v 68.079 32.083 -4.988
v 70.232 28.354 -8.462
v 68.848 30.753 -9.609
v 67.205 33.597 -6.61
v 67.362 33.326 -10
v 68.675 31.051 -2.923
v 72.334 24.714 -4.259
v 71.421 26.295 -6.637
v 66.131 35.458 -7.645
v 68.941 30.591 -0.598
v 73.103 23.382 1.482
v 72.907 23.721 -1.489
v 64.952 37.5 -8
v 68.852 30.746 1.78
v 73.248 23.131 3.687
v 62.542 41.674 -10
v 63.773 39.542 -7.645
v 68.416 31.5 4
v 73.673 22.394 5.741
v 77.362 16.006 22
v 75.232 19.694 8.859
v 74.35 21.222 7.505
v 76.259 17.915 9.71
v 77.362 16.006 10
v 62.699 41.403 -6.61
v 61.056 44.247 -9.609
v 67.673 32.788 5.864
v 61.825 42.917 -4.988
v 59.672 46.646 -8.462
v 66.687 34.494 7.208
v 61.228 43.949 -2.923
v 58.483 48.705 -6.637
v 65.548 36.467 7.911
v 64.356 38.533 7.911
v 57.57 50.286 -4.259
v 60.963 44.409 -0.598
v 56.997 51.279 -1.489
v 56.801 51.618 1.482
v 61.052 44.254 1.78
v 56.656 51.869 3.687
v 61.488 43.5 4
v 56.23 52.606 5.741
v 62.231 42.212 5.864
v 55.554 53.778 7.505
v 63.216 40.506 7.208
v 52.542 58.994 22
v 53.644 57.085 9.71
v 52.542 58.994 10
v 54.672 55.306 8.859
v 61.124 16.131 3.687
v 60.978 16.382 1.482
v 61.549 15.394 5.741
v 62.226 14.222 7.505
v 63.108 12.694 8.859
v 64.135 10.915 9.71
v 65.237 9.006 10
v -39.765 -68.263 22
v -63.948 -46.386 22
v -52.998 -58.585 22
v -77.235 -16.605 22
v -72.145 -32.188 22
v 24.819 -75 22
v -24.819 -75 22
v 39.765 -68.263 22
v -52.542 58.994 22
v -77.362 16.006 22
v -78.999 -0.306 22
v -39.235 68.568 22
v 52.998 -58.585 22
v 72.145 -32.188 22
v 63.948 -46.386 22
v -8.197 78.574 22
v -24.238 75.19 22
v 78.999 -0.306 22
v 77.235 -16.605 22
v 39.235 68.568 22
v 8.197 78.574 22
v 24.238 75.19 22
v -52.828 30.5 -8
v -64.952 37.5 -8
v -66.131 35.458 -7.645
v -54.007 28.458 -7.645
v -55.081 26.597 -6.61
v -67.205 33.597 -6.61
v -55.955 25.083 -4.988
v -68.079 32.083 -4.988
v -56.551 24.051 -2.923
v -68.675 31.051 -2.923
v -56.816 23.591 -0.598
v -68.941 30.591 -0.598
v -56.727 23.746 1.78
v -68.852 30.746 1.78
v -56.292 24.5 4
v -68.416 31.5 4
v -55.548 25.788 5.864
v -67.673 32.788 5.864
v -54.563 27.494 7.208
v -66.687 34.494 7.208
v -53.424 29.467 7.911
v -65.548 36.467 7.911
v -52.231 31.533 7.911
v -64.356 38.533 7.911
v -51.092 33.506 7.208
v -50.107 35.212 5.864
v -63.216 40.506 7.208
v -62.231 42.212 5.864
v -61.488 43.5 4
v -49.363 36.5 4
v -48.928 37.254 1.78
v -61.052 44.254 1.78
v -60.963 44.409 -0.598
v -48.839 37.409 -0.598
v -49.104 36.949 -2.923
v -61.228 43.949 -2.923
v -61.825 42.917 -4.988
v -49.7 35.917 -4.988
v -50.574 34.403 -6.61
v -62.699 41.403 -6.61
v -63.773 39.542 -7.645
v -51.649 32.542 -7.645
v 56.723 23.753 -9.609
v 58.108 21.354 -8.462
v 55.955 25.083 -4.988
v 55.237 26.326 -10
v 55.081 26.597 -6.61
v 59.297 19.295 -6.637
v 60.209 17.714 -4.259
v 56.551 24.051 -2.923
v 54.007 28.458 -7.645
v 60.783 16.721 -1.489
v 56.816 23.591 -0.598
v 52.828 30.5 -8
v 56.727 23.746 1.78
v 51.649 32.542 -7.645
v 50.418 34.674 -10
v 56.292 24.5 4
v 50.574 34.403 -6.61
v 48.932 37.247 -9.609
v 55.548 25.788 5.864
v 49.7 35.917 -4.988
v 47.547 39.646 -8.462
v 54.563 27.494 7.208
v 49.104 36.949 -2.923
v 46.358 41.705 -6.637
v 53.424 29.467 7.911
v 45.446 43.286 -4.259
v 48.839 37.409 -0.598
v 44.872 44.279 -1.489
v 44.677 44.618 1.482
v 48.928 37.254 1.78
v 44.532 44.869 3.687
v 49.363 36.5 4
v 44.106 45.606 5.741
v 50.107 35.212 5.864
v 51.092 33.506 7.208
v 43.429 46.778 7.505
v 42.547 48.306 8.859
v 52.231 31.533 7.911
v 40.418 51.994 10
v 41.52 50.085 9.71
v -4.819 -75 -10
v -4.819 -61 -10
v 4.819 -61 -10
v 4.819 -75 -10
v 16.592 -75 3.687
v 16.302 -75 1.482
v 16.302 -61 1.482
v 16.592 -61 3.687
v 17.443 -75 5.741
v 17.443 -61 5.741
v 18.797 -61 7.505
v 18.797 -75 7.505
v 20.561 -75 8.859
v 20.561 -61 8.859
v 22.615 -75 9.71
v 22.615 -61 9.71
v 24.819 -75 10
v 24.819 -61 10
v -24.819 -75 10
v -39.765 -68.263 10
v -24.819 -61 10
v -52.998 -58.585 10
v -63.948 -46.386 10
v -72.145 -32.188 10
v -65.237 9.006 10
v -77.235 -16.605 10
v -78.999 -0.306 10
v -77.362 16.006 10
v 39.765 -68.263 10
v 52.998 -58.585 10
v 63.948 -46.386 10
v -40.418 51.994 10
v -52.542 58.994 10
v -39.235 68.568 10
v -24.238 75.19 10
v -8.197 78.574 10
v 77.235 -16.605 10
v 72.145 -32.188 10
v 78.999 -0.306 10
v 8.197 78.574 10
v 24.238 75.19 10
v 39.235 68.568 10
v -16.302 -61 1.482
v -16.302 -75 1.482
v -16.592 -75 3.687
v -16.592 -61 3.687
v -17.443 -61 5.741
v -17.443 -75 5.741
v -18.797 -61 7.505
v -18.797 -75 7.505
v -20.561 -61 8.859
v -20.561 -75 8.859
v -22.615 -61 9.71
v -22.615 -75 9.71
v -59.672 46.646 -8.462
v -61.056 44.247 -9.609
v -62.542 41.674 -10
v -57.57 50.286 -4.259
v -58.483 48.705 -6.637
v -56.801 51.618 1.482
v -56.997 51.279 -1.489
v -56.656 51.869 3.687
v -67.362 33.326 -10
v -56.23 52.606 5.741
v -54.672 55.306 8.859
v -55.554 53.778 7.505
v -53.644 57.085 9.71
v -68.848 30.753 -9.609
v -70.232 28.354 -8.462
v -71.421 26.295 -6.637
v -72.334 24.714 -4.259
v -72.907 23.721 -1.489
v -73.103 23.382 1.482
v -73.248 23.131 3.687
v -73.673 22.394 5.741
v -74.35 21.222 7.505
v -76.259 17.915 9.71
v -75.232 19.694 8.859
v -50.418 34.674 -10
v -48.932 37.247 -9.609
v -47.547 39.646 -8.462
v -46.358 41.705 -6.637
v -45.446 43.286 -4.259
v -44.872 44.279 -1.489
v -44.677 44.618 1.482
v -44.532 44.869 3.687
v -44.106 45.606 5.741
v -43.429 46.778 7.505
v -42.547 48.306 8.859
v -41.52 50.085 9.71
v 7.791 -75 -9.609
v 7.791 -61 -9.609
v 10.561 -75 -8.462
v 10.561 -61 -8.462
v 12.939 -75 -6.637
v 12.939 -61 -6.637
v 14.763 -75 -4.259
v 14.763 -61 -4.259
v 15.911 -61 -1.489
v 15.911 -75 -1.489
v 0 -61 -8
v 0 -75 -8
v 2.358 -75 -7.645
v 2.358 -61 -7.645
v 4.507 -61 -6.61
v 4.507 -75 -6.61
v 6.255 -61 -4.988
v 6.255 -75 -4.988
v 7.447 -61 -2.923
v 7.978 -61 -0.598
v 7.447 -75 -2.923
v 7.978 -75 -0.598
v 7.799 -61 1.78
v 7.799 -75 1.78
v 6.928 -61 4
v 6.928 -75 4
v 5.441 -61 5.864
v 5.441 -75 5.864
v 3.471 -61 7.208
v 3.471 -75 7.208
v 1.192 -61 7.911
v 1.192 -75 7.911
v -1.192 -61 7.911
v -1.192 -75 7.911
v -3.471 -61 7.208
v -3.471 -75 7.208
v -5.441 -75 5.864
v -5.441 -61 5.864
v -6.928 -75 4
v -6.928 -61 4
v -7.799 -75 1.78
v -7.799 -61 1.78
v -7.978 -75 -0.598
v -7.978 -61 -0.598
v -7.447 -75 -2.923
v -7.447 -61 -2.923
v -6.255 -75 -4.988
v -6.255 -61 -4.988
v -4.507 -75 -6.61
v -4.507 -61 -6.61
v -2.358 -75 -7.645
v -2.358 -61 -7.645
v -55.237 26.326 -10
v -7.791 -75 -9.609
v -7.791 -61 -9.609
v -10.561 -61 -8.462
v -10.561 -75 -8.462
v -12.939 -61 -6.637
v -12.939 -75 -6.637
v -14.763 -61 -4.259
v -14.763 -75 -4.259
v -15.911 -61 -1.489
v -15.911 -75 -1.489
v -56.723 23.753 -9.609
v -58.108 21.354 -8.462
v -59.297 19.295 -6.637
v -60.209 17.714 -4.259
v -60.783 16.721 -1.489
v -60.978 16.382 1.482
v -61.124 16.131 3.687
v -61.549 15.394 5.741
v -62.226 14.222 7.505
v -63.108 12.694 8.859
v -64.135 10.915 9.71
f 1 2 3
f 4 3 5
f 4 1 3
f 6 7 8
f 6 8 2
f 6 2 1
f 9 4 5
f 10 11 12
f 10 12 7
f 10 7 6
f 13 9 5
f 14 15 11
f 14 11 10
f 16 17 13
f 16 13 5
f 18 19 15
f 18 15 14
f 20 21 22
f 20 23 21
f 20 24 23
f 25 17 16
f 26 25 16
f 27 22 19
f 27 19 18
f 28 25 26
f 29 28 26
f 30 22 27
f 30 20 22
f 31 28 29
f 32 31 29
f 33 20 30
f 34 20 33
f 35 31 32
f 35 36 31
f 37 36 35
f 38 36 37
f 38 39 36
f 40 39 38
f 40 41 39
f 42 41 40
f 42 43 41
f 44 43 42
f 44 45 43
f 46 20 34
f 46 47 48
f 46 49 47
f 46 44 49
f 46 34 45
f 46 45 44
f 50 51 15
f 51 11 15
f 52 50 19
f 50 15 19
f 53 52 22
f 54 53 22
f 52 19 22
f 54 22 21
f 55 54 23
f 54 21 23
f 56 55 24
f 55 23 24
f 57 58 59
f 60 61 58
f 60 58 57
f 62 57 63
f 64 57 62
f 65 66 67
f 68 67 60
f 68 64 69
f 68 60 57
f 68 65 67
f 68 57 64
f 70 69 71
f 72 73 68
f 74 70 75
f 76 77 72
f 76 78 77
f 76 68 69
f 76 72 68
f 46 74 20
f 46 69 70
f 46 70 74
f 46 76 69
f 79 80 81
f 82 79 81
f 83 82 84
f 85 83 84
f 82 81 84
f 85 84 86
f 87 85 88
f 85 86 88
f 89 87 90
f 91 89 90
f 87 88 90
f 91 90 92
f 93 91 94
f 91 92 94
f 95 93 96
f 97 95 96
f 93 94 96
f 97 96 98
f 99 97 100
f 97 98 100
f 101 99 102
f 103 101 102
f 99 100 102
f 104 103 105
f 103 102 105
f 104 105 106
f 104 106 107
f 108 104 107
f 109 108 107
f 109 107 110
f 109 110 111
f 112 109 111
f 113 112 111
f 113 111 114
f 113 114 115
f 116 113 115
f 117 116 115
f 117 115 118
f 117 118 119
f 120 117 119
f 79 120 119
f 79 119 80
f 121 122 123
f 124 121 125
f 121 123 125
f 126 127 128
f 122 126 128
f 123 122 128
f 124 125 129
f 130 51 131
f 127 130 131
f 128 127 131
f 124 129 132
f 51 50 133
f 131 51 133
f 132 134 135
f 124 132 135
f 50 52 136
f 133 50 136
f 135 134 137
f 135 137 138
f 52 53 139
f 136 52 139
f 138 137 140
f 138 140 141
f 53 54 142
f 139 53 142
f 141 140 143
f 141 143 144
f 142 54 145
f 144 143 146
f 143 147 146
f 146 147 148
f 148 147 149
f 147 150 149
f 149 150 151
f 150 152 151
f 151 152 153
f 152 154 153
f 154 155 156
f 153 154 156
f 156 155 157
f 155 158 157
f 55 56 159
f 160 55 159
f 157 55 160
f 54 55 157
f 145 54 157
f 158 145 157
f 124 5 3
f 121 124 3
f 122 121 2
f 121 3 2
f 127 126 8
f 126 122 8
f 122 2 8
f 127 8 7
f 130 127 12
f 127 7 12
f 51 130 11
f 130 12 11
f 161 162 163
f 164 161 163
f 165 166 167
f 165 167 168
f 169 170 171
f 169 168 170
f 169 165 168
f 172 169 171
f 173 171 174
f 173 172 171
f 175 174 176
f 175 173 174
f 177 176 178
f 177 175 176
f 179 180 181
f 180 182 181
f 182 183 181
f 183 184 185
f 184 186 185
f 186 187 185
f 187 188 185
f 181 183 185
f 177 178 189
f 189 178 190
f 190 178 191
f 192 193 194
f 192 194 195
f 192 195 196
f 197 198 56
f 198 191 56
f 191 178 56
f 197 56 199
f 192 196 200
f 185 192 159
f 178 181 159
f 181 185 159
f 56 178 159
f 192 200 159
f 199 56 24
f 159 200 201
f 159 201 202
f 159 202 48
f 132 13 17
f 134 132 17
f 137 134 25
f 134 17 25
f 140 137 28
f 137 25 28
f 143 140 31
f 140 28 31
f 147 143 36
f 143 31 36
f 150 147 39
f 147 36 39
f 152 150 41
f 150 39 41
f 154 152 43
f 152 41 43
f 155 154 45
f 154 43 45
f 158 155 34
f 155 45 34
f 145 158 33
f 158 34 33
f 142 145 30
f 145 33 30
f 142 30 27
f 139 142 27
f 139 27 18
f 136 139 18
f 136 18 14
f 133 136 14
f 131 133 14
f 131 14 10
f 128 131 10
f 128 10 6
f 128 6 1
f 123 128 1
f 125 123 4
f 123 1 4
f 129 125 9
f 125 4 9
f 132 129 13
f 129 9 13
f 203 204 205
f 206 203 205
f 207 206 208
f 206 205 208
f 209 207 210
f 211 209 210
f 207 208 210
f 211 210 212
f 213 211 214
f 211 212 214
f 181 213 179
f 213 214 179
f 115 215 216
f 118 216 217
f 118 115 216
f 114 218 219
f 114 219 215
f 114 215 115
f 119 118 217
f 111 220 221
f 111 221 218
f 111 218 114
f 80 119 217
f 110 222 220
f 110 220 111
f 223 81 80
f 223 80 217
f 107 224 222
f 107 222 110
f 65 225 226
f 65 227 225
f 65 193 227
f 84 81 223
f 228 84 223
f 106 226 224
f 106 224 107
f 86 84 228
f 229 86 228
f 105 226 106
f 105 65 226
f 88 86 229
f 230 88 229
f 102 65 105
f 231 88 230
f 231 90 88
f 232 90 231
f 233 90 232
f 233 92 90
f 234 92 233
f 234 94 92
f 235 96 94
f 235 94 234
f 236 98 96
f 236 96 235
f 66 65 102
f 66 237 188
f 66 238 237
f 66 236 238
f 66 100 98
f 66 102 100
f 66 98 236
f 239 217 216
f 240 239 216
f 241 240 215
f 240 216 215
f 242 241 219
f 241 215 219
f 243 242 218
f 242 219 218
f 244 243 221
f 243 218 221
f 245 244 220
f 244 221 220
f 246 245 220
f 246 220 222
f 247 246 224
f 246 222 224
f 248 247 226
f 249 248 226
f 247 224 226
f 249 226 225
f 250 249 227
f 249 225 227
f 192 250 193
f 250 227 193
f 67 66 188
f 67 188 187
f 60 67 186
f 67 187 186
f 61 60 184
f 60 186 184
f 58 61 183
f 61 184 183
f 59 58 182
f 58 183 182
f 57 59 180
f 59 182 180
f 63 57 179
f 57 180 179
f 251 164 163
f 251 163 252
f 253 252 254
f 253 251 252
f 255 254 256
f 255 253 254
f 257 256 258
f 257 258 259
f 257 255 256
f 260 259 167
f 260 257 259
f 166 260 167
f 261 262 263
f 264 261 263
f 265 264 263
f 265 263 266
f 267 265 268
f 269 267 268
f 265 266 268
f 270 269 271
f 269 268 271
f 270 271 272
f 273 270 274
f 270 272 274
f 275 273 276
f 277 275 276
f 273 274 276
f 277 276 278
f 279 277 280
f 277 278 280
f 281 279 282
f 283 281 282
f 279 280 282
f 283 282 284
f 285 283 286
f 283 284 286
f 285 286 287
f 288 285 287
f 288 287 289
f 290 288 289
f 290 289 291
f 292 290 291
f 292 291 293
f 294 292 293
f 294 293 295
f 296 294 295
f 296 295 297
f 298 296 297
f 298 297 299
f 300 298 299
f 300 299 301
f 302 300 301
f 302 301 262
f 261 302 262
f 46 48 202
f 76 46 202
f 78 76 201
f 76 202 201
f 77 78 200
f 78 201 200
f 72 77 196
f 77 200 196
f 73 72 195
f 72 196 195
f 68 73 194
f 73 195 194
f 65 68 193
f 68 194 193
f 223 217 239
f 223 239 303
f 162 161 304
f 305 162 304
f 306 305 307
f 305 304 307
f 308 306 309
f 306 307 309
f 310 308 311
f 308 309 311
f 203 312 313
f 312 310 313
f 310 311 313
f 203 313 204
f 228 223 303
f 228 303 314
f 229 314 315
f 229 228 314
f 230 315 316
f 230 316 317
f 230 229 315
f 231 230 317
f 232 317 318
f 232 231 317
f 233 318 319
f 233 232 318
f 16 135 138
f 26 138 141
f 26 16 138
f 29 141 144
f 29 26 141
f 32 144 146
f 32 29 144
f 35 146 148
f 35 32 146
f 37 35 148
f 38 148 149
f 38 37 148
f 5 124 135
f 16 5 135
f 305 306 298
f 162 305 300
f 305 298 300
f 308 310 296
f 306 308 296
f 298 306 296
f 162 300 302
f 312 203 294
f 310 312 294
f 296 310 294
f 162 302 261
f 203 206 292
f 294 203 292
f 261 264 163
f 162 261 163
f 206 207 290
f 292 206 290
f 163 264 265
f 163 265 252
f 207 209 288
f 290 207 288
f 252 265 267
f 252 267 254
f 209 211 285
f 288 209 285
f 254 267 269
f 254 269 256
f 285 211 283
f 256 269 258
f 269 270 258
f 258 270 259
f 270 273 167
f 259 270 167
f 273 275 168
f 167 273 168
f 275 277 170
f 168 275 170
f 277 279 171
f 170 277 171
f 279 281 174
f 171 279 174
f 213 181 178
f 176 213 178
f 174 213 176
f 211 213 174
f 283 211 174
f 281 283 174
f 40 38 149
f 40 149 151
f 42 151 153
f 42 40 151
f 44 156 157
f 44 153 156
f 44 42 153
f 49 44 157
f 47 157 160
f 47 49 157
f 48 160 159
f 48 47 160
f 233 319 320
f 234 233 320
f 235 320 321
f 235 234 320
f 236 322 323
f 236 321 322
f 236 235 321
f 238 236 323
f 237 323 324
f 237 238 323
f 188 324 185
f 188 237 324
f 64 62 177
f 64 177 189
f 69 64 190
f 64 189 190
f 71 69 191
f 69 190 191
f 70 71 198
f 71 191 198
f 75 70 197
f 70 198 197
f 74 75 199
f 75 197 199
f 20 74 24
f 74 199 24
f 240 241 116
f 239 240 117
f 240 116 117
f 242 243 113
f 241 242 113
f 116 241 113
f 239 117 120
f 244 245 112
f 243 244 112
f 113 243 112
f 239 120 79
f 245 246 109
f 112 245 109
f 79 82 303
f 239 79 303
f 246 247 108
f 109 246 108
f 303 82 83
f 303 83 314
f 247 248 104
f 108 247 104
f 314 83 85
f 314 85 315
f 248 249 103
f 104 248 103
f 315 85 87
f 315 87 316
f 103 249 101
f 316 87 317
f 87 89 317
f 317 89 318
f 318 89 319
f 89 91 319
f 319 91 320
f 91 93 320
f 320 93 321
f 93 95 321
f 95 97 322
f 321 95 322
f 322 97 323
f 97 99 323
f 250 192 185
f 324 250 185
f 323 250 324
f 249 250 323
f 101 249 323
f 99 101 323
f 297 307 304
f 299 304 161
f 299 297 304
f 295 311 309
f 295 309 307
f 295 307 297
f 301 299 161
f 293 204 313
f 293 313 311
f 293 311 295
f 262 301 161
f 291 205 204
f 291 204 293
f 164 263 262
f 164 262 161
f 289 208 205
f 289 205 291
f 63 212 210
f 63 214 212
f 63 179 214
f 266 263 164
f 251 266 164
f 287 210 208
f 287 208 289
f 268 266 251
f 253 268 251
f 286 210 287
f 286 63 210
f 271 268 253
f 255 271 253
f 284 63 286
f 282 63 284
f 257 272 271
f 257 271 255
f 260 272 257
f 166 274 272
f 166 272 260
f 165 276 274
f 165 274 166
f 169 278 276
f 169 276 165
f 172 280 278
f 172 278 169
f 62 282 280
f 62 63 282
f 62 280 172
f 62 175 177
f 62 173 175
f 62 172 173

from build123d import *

# Parameters (mm, degrees)
SKETCH2_R                   = 79
BOSS_EXTRUDE1_DEPTH         = 12
SKETCH2_3_W                 = 49.638694584
SKETCH2_3_H                 = 14
CUT_EXTRUDE1_DEPTH          = 113.365475125
SKETCH2_4_W                 = 49.638694584
SKETCH2_4_H                 = 14
BOSS_EXTRUDE2_DEPTH         = 20
SKETCH3_R                   = 8
CUT_EXTRUDE2_DEPTH          = 175.232603149
CIRPATTERN1_COUNT           = 3
CIRPATTERN1_COPY_1_SKETCH_R = 8
CIRPATTERN1_COPY_1_DEPTH    = 175.232603149
CIRPATTERN1_COPY_2_SKETCH_R = 8
CIRPATTERN1_COPY_2_DEPTH    = 175.232603149


with BuildPart() as part:
    # Sketch2 → Boss-Extrude1 (new body)
    with BuildSketch(Plane.XY):
        Circle(SKETCH2_R)
    extrude(amount=BOSS_EXTRUDE1_DEPTH)

    # Sketch2<3> → Cut-Extrude1 (cut, symmetric)
    with BuildSketch(Plane.XY):
        with Locations((0, -82)):
            Rectangle(SKETCH2_3_W, SKETCH2_3_H)
    cut_extrude1 = extrude(amount=CUT_EXTRUDE1_DEPTH, both=True, mode=Mode.SUBTRACT)

    # Sketch2<4> → Boss-Extrude2 (add)
    with BuildSketch(Plane.XY):
        with Locations((0, -68)):
            Rectangle(SKETCH2_4_W, SKETCH2_4_H)
    boss_extrude2 = extrude(amount=-BOSS_EXTRUDE2_DEPTH)

    # Sketch3 → Cut-Extrude2 (cut, symmetric)
    with BuildSketch(Plane.XZ.offset(75)):
        with Locations(Location((0, -10, 0), (0, 0, 270))):
            Circle(SKETCH3_R)
        with BuildLine():
            Line((-24.819347292, 0), (-24.819347292, -20))
            Line((-24.819347292, -20), (-4.819347292, -20))
            ThreePointArc((-4.819347292, -20), (-12.938662868, -16.636869371), (-16.301793497, -8.517553795))
            ThreePointArc((-16.301793497, -8.517553795), (-18.796527244, -2.494733747), (-24.819347292, 0))
        make_face()
    cut_extrude2 = extrude(amount=CUT_EXTRUDE2_DEPTH, both=True, mode=Mode.SUBTRACT)

    # Mirror1: Cut-Extrude2 across plane
    add(cut_extrude2.mirror(Plane(origin=(0, 0, 0), x_dir=(0, 0, 1), z_dir=(1, 0, 0))), mode=Mode.SUBTRACT)

    # CirPattern1: Cut-Extrude1, Boss-Extrude2, Cut-Extrude2 ×3 about axis
    cirpattern1_axis = Axis((0, 0, 0), (0, 0, 1))
    add([cut_extrude1.rotate(cirpattern1_axis, i * 360 / CIRPATTERN1_COUNT) for i in range(1, CIRPATTERN1_COUNT)], mode=Mode.SUBTRACT)
    add([boss_extrude2.rotate(cirpattern1_axis, i * 360 / CIRPATTERN1_COUNT) for i in range(1, CIRPATTERN1_COUNT)])
    add([cut_extrude2.rotate(cirpattern1_axis, i * 360 / CIRPATTERN1_COUNT) for i in range(1, CIRPATTERN1_COUNT)], mode=Mode.SUBTRACT)

    # CirPattern1 copy 1 sketch → CirPattern1 copy 1 (cut, symmetric)
    with BuildSketch(Plane(origin=(64.951905284, 37.5, 0), x_dir=(0.4999999999999998, -0.8660254037844387, 0), z_dir=(0.8660254037844387, 0.4999999999999998, 0))):
        with Locations((0, 10)):
            Circle(CIRPATTERN1_COPY_1_SKETCH_R)
        with BuildLine():
            Line((-24.819347292, 0), (-24.819347292, 20))
            Line((-24.819347292, 20), (-4.819347292, 20))
            ThreePointArc((-4.819347292, 20), (-12.938662868, 16.636869371), (-16.301793497, 8.517553795))
            ThreePointArc((-16.301793497, 8.517553795), (-18.796527244, 2.494733747), (-24.819347292, 0))
        make_face()
    extrude(amount=CIRPATTERN1_COPY_1_DEPTH, both=True, mode=Mode.SUBTRACT)

    # CirPattern1 copy 2 sketch → CirPattern1 copy 2 (cut, symmetric)
    with BuildSketch(Plane(origin=(-64.951905284, 37.5, 0), x_dir=(0.5000000000000004, 0.8660254037844384, 0), z_dir=(-0.8660254037844384, 0.5000000000000004, 0))):
        with Locations((0, 10)):
            Circle(CIRPATTERN1_COPY_2_SKETCH_R)
        with BuildLine():
            Line((-24.819347292, 0), (-24.819347292, 20))
            Line((-24.819347292, 20), (-4.819347292, 20))
            ThreePointArc((-4.819347292, 20), (-12.938662868, 16.636869371), (-16.301793497, 8.517553795))
            ThreePointArc((-16.301793497, 8.517553795), (-18.796527244, 2.494733747), (-24.819347292, 0))
        make_face()
    extrude(amount=CIRPATTERN1_COPY_2_DEPTH, both=True, mode=Mode.SUBTRACT)


with BuildPart() as part_1:
    # Body-Move/Copy1: moved
    add(part.part.moved(Location((0, -5e-08, 10))))


solid = part_1.part
